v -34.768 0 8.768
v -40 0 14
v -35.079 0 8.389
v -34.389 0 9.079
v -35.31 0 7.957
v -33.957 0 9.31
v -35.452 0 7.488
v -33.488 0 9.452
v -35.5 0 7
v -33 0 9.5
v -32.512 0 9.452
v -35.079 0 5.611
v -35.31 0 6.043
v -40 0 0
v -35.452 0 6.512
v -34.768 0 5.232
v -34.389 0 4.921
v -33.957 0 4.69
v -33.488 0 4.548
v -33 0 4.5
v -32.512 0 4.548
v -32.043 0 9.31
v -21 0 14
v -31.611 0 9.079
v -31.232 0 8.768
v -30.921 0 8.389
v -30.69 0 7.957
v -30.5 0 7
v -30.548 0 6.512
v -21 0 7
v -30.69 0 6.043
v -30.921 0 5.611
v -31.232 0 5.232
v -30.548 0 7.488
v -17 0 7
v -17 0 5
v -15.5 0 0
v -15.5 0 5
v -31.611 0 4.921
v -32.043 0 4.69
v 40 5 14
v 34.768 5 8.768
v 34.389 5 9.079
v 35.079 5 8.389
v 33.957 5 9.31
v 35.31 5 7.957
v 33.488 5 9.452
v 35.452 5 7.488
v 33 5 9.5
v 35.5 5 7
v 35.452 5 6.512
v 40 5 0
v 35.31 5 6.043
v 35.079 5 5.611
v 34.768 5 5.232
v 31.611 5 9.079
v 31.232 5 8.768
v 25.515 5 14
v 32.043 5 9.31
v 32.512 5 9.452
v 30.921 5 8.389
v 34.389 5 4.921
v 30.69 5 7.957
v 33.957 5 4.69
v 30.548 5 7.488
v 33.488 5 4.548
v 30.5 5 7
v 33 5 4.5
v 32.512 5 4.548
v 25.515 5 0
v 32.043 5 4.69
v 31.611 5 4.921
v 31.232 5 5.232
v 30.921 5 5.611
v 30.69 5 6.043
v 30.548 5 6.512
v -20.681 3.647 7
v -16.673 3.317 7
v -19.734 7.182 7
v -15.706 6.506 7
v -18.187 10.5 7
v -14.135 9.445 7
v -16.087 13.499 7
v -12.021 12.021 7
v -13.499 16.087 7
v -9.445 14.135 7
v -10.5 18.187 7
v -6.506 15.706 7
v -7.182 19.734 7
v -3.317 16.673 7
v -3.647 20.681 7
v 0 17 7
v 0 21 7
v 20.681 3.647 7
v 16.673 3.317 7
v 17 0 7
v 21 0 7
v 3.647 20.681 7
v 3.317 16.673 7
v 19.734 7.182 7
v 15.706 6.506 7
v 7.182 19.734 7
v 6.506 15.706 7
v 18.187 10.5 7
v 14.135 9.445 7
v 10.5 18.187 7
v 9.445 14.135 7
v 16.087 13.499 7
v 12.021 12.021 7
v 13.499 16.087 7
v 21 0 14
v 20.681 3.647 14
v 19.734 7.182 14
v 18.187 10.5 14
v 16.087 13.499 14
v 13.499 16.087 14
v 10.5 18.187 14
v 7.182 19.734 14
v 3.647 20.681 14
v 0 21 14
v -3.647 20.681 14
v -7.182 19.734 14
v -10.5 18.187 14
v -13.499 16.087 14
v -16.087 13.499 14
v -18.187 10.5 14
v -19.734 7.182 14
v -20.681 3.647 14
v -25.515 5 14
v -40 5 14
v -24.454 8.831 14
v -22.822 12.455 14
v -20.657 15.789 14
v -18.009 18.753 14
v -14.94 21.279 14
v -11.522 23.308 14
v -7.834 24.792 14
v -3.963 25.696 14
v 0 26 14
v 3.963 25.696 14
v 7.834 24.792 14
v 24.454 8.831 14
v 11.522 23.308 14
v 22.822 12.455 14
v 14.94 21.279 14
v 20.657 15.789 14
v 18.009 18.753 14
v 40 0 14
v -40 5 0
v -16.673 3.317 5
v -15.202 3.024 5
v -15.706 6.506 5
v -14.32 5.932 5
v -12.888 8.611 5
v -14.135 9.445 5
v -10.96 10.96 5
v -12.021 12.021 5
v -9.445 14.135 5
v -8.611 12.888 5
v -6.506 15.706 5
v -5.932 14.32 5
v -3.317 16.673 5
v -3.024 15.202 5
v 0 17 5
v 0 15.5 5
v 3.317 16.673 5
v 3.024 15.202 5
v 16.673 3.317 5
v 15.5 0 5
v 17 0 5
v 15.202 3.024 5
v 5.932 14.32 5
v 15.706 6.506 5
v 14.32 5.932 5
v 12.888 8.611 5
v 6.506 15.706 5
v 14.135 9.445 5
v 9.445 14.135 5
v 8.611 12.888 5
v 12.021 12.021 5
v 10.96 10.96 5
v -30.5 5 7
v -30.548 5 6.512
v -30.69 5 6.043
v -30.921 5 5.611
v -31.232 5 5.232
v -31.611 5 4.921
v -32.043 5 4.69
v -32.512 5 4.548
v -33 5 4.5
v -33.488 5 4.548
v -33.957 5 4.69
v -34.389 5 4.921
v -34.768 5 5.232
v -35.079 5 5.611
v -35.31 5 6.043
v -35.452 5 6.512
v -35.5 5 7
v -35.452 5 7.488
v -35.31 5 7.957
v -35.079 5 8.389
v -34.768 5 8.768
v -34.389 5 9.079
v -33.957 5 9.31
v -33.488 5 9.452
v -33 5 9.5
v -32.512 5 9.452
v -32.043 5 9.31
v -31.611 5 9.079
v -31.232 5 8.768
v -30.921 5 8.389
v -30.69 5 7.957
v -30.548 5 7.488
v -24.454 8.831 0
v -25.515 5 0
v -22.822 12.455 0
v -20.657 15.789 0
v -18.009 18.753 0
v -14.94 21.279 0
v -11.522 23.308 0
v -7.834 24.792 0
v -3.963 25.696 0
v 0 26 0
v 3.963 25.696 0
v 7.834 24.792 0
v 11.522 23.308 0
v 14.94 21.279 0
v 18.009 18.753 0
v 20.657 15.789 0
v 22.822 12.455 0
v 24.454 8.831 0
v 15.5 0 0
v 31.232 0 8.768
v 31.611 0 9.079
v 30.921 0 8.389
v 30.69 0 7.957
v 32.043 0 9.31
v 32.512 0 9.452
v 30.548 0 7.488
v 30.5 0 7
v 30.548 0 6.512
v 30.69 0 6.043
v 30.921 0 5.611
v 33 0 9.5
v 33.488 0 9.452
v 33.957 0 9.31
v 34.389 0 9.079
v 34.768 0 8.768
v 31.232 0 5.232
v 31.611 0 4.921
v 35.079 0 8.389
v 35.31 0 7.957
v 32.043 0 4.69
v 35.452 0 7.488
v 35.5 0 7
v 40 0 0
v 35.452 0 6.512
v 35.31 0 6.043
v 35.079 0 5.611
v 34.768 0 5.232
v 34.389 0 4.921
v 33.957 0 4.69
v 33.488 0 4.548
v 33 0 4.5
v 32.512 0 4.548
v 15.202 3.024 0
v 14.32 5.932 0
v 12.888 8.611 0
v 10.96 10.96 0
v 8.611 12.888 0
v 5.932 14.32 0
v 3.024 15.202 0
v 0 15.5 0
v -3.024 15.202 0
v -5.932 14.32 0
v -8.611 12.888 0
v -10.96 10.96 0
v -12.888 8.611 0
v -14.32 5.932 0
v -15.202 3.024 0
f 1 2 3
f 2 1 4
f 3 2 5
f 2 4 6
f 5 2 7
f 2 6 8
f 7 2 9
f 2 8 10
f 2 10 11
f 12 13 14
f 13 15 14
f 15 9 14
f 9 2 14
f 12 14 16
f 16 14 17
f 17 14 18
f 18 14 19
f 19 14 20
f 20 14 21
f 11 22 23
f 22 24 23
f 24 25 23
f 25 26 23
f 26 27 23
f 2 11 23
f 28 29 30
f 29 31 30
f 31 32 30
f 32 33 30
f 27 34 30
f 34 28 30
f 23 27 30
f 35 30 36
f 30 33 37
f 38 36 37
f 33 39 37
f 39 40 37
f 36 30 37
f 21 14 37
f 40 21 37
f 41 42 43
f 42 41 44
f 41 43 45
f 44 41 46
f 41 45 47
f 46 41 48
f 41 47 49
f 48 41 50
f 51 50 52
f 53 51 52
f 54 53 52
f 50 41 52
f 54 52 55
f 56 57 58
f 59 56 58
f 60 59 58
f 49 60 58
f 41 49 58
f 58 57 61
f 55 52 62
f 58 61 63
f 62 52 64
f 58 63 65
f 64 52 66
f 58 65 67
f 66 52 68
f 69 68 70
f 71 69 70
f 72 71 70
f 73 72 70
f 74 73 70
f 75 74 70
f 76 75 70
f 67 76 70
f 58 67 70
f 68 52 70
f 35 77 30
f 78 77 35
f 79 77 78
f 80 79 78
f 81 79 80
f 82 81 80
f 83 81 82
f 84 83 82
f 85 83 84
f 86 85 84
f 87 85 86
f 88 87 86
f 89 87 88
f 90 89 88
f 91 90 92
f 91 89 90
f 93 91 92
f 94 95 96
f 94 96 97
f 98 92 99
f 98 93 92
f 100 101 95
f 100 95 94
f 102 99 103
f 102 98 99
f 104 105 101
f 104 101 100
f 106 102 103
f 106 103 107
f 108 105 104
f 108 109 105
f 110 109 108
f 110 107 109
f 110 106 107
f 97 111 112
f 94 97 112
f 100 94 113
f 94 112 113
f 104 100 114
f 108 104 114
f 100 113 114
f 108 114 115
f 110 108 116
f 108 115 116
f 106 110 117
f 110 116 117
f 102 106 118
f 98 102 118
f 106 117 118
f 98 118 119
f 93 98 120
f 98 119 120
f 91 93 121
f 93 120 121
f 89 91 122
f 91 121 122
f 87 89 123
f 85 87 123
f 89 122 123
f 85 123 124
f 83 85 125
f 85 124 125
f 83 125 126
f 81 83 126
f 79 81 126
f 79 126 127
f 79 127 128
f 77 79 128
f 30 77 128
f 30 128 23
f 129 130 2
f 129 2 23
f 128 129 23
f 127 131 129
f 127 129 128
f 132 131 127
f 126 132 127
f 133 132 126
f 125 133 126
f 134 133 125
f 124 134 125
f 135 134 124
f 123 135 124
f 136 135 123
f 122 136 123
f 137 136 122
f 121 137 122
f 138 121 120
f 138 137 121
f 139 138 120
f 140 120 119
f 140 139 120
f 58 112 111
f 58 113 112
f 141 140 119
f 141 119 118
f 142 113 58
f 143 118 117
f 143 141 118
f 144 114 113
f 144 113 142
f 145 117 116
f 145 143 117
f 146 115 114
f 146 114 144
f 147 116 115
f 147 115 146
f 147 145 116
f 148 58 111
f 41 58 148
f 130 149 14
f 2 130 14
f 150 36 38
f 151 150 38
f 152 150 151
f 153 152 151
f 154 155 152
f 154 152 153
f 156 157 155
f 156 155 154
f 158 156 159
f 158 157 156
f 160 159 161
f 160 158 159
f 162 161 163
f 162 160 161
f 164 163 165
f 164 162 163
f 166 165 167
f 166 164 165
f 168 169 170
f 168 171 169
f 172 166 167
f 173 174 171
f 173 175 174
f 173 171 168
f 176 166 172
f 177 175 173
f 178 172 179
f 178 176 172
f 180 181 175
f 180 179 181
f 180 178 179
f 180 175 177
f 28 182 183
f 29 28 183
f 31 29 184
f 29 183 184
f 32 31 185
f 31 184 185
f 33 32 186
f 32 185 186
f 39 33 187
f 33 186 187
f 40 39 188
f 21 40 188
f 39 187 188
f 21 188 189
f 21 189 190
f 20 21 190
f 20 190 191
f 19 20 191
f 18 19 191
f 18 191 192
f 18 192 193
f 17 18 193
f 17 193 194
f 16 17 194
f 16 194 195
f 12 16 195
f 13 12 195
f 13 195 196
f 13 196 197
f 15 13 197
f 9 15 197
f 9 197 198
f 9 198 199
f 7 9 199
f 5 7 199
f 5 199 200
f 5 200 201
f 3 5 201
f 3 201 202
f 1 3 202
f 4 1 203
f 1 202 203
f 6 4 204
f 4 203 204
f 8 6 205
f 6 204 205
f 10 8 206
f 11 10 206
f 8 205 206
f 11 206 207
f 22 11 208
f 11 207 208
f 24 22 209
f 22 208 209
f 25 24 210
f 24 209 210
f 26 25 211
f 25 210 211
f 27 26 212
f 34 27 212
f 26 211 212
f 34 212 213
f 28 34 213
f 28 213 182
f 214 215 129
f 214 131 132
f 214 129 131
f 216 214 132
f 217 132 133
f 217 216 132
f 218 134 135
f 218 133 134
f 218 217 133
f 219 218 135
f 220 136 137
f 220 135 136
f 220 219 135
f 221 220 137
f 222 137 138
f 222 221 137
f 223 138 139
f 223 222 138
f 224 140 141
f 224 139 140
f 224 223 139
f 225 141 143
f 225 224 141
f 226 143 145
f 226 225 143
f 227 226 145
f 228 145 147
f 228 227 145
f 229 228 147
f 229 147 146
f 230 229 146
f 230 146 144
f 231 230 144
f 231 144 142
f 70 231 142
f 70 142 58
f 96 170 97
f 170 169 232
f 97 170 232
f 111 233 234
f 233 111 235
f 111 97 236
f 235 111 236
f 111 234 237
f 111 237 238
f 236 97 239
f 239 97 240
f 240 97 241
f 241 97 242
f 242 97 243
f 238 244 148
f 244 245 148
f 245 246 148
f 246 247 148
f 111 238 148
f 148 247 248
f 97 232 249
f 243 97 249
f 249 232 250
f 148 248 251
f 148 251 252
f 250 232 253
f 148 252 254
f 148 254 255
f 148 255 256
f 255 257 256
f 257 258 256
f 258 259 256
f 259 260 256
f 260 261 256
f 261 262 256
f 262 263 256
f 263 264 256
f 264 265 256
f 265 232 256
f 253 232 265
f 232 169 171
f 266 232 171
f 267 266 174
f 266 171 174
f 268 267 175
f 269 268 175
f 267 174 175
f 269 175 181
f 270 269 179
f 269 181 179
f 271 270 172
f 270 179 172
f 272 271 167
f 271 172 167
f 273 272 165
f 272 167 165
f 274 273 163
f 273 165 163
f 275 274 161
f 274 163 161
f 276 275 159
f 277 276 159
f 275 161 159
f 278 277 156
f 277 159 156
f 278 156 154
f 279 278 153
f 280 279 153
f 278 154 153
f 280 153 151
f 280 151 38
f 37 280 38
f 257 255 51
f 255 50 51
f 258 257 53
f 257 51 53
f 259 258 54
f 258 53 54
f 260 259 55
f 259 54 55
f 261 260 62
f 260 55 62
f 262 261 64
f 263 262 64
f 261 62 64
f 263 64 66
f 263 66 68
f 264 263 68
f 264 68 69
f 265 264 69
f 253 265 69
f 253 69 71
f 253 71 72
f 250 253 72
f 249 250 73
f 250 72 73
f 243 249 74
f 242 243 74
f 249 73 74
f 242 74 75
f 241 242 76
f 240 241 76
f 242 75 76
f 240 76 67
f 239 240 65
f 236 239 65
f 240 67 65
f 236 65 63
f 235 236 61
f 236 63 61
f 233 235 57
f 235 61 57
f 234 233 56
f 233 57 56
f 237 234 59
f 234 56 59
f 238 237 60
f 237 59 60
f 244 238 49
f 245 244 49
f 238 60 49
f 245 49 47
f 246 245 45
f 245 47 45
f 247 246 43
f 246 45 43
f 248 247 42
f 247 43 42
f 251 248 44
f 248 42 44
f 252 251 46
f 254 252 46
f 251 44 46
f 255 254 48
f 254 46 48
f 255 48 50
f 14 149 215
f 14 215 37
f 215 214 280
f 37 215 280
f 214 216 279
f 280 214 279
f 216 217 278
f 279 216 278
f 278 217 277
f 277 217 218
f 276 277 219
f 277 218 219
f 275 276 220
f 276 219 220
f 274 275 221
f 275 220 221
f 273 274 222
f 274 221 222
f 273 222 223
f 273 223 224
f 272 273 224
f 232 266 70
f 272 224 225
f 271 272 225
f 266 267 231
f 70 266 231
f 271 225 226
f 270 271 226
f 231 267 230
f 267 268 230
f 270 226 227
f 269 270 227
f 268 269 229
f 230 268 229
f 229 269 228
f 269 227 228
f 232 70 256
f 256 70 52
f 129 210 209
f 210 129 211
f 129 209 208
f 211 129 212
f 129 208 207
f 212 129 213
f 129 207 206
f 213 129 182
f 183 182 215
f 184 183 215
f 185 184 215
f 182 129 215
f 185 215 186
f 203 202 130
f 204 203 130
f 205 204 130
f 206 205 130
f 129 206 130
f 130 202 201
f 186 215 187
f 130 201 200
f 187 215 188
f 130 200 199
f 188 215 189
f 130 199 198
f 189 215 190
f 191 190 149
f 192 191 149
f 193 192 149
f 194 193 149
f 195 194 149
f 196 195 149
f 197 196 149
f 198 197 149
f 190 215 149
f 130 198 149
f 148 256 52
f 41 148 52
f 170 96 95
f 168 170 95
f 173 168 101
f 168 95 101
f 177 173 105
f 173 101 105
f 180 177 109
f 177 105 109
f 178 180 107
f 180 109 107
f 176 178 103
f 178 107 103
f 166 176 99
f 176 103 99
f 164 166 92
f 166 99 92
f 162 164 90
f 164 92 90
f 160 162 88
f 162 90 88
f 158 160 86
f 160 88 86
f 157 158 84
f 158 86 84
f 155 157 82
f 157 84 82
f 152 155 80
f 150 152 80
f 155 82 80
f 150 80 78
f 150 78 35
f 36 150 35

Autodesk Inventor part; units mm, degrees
ref_plane "YZ Plane" through (0, 0, 0) normal (1, 0, 0) x (0, 1, 0)
ref_plane "XZ Plane" through (0, 0, 0) normal (0, 1, 0) x (-1, 0, 0)
ref_plane "XY Plane" through (0, 0, 0) normal (0, 0, 1) x (1, 0, 0)
sketch "草图1" plane through (0, 0, 0) normal (0, 0, 1) x (1, 0, 0)
  line L0 (-40, 0) -> (40, 0)
  line L1 (40, 0) -> (40, 5)
  line L2 (40, 5) -> (-40, 5)
  line L3 (-40, 5) -> (-40, 0)
  arc A0 (26, 0) -> (-26, 0) centre (0, 0) ccw
  dimension "d0" = 80
  dimension "d1" = 5
  dimension "d2" = 26
extrude "拉伸1" add sketch "草图1" along normal blind 14
sketch "草图2" plane through (0, 0, 14) normal (0, 0, 1) x (1, 0, 0)
  circle A0 centre (0, 0) radius 21
  dimension "d5" = 42
extrude "拉伸2" cut sketch "草图2" against normal blind 7
sketch "草图3" plane through (0, 0, 7) normal (0, 0, 1) x (1, 0, 0)
  circle A0 centre (0, 0) radius 17
  dimension "d8" = 34
extrude "拉伸3" cut sketch "草图3" against normal blind 2
sketch "草图4" plane through (0, 0, 5) normal (0, 0, 1) x (1, 0, 0)
  circle A0 centre (0, 0) radius 15.5
  dimension "d11" = 31
extrude "拉伸4" cut sketch "草图4" against normal blind 5
sketch "草图5" plane through (-40, 5, 0) normal (0, 1, 0) x (1, 0, 0)
  circle A0 centre (7, -7) radius 2.5
  circle A1 centre (73, -7) radius 2.5
  line L0 (80, 0) -> (80, -14) projected
  line L1 (80, -14) -> (65.5147, -14) projected
  line L2 (0, 0) -> (0, -14) projected
  line L3 (14.4853, -14) -> (0, -14) projected
  point P0 (40, 0)
  dimension "d14" = 5
  dimension "d15" = 5
  dimension "d16" = 7
  dimension "d17" = 7
  dimension "d18" = 7
  dimension "d19" = 7
extrude "拉伸5" cut sketch "草图5" against normal through all
properties part number "电机座上轴盖"
